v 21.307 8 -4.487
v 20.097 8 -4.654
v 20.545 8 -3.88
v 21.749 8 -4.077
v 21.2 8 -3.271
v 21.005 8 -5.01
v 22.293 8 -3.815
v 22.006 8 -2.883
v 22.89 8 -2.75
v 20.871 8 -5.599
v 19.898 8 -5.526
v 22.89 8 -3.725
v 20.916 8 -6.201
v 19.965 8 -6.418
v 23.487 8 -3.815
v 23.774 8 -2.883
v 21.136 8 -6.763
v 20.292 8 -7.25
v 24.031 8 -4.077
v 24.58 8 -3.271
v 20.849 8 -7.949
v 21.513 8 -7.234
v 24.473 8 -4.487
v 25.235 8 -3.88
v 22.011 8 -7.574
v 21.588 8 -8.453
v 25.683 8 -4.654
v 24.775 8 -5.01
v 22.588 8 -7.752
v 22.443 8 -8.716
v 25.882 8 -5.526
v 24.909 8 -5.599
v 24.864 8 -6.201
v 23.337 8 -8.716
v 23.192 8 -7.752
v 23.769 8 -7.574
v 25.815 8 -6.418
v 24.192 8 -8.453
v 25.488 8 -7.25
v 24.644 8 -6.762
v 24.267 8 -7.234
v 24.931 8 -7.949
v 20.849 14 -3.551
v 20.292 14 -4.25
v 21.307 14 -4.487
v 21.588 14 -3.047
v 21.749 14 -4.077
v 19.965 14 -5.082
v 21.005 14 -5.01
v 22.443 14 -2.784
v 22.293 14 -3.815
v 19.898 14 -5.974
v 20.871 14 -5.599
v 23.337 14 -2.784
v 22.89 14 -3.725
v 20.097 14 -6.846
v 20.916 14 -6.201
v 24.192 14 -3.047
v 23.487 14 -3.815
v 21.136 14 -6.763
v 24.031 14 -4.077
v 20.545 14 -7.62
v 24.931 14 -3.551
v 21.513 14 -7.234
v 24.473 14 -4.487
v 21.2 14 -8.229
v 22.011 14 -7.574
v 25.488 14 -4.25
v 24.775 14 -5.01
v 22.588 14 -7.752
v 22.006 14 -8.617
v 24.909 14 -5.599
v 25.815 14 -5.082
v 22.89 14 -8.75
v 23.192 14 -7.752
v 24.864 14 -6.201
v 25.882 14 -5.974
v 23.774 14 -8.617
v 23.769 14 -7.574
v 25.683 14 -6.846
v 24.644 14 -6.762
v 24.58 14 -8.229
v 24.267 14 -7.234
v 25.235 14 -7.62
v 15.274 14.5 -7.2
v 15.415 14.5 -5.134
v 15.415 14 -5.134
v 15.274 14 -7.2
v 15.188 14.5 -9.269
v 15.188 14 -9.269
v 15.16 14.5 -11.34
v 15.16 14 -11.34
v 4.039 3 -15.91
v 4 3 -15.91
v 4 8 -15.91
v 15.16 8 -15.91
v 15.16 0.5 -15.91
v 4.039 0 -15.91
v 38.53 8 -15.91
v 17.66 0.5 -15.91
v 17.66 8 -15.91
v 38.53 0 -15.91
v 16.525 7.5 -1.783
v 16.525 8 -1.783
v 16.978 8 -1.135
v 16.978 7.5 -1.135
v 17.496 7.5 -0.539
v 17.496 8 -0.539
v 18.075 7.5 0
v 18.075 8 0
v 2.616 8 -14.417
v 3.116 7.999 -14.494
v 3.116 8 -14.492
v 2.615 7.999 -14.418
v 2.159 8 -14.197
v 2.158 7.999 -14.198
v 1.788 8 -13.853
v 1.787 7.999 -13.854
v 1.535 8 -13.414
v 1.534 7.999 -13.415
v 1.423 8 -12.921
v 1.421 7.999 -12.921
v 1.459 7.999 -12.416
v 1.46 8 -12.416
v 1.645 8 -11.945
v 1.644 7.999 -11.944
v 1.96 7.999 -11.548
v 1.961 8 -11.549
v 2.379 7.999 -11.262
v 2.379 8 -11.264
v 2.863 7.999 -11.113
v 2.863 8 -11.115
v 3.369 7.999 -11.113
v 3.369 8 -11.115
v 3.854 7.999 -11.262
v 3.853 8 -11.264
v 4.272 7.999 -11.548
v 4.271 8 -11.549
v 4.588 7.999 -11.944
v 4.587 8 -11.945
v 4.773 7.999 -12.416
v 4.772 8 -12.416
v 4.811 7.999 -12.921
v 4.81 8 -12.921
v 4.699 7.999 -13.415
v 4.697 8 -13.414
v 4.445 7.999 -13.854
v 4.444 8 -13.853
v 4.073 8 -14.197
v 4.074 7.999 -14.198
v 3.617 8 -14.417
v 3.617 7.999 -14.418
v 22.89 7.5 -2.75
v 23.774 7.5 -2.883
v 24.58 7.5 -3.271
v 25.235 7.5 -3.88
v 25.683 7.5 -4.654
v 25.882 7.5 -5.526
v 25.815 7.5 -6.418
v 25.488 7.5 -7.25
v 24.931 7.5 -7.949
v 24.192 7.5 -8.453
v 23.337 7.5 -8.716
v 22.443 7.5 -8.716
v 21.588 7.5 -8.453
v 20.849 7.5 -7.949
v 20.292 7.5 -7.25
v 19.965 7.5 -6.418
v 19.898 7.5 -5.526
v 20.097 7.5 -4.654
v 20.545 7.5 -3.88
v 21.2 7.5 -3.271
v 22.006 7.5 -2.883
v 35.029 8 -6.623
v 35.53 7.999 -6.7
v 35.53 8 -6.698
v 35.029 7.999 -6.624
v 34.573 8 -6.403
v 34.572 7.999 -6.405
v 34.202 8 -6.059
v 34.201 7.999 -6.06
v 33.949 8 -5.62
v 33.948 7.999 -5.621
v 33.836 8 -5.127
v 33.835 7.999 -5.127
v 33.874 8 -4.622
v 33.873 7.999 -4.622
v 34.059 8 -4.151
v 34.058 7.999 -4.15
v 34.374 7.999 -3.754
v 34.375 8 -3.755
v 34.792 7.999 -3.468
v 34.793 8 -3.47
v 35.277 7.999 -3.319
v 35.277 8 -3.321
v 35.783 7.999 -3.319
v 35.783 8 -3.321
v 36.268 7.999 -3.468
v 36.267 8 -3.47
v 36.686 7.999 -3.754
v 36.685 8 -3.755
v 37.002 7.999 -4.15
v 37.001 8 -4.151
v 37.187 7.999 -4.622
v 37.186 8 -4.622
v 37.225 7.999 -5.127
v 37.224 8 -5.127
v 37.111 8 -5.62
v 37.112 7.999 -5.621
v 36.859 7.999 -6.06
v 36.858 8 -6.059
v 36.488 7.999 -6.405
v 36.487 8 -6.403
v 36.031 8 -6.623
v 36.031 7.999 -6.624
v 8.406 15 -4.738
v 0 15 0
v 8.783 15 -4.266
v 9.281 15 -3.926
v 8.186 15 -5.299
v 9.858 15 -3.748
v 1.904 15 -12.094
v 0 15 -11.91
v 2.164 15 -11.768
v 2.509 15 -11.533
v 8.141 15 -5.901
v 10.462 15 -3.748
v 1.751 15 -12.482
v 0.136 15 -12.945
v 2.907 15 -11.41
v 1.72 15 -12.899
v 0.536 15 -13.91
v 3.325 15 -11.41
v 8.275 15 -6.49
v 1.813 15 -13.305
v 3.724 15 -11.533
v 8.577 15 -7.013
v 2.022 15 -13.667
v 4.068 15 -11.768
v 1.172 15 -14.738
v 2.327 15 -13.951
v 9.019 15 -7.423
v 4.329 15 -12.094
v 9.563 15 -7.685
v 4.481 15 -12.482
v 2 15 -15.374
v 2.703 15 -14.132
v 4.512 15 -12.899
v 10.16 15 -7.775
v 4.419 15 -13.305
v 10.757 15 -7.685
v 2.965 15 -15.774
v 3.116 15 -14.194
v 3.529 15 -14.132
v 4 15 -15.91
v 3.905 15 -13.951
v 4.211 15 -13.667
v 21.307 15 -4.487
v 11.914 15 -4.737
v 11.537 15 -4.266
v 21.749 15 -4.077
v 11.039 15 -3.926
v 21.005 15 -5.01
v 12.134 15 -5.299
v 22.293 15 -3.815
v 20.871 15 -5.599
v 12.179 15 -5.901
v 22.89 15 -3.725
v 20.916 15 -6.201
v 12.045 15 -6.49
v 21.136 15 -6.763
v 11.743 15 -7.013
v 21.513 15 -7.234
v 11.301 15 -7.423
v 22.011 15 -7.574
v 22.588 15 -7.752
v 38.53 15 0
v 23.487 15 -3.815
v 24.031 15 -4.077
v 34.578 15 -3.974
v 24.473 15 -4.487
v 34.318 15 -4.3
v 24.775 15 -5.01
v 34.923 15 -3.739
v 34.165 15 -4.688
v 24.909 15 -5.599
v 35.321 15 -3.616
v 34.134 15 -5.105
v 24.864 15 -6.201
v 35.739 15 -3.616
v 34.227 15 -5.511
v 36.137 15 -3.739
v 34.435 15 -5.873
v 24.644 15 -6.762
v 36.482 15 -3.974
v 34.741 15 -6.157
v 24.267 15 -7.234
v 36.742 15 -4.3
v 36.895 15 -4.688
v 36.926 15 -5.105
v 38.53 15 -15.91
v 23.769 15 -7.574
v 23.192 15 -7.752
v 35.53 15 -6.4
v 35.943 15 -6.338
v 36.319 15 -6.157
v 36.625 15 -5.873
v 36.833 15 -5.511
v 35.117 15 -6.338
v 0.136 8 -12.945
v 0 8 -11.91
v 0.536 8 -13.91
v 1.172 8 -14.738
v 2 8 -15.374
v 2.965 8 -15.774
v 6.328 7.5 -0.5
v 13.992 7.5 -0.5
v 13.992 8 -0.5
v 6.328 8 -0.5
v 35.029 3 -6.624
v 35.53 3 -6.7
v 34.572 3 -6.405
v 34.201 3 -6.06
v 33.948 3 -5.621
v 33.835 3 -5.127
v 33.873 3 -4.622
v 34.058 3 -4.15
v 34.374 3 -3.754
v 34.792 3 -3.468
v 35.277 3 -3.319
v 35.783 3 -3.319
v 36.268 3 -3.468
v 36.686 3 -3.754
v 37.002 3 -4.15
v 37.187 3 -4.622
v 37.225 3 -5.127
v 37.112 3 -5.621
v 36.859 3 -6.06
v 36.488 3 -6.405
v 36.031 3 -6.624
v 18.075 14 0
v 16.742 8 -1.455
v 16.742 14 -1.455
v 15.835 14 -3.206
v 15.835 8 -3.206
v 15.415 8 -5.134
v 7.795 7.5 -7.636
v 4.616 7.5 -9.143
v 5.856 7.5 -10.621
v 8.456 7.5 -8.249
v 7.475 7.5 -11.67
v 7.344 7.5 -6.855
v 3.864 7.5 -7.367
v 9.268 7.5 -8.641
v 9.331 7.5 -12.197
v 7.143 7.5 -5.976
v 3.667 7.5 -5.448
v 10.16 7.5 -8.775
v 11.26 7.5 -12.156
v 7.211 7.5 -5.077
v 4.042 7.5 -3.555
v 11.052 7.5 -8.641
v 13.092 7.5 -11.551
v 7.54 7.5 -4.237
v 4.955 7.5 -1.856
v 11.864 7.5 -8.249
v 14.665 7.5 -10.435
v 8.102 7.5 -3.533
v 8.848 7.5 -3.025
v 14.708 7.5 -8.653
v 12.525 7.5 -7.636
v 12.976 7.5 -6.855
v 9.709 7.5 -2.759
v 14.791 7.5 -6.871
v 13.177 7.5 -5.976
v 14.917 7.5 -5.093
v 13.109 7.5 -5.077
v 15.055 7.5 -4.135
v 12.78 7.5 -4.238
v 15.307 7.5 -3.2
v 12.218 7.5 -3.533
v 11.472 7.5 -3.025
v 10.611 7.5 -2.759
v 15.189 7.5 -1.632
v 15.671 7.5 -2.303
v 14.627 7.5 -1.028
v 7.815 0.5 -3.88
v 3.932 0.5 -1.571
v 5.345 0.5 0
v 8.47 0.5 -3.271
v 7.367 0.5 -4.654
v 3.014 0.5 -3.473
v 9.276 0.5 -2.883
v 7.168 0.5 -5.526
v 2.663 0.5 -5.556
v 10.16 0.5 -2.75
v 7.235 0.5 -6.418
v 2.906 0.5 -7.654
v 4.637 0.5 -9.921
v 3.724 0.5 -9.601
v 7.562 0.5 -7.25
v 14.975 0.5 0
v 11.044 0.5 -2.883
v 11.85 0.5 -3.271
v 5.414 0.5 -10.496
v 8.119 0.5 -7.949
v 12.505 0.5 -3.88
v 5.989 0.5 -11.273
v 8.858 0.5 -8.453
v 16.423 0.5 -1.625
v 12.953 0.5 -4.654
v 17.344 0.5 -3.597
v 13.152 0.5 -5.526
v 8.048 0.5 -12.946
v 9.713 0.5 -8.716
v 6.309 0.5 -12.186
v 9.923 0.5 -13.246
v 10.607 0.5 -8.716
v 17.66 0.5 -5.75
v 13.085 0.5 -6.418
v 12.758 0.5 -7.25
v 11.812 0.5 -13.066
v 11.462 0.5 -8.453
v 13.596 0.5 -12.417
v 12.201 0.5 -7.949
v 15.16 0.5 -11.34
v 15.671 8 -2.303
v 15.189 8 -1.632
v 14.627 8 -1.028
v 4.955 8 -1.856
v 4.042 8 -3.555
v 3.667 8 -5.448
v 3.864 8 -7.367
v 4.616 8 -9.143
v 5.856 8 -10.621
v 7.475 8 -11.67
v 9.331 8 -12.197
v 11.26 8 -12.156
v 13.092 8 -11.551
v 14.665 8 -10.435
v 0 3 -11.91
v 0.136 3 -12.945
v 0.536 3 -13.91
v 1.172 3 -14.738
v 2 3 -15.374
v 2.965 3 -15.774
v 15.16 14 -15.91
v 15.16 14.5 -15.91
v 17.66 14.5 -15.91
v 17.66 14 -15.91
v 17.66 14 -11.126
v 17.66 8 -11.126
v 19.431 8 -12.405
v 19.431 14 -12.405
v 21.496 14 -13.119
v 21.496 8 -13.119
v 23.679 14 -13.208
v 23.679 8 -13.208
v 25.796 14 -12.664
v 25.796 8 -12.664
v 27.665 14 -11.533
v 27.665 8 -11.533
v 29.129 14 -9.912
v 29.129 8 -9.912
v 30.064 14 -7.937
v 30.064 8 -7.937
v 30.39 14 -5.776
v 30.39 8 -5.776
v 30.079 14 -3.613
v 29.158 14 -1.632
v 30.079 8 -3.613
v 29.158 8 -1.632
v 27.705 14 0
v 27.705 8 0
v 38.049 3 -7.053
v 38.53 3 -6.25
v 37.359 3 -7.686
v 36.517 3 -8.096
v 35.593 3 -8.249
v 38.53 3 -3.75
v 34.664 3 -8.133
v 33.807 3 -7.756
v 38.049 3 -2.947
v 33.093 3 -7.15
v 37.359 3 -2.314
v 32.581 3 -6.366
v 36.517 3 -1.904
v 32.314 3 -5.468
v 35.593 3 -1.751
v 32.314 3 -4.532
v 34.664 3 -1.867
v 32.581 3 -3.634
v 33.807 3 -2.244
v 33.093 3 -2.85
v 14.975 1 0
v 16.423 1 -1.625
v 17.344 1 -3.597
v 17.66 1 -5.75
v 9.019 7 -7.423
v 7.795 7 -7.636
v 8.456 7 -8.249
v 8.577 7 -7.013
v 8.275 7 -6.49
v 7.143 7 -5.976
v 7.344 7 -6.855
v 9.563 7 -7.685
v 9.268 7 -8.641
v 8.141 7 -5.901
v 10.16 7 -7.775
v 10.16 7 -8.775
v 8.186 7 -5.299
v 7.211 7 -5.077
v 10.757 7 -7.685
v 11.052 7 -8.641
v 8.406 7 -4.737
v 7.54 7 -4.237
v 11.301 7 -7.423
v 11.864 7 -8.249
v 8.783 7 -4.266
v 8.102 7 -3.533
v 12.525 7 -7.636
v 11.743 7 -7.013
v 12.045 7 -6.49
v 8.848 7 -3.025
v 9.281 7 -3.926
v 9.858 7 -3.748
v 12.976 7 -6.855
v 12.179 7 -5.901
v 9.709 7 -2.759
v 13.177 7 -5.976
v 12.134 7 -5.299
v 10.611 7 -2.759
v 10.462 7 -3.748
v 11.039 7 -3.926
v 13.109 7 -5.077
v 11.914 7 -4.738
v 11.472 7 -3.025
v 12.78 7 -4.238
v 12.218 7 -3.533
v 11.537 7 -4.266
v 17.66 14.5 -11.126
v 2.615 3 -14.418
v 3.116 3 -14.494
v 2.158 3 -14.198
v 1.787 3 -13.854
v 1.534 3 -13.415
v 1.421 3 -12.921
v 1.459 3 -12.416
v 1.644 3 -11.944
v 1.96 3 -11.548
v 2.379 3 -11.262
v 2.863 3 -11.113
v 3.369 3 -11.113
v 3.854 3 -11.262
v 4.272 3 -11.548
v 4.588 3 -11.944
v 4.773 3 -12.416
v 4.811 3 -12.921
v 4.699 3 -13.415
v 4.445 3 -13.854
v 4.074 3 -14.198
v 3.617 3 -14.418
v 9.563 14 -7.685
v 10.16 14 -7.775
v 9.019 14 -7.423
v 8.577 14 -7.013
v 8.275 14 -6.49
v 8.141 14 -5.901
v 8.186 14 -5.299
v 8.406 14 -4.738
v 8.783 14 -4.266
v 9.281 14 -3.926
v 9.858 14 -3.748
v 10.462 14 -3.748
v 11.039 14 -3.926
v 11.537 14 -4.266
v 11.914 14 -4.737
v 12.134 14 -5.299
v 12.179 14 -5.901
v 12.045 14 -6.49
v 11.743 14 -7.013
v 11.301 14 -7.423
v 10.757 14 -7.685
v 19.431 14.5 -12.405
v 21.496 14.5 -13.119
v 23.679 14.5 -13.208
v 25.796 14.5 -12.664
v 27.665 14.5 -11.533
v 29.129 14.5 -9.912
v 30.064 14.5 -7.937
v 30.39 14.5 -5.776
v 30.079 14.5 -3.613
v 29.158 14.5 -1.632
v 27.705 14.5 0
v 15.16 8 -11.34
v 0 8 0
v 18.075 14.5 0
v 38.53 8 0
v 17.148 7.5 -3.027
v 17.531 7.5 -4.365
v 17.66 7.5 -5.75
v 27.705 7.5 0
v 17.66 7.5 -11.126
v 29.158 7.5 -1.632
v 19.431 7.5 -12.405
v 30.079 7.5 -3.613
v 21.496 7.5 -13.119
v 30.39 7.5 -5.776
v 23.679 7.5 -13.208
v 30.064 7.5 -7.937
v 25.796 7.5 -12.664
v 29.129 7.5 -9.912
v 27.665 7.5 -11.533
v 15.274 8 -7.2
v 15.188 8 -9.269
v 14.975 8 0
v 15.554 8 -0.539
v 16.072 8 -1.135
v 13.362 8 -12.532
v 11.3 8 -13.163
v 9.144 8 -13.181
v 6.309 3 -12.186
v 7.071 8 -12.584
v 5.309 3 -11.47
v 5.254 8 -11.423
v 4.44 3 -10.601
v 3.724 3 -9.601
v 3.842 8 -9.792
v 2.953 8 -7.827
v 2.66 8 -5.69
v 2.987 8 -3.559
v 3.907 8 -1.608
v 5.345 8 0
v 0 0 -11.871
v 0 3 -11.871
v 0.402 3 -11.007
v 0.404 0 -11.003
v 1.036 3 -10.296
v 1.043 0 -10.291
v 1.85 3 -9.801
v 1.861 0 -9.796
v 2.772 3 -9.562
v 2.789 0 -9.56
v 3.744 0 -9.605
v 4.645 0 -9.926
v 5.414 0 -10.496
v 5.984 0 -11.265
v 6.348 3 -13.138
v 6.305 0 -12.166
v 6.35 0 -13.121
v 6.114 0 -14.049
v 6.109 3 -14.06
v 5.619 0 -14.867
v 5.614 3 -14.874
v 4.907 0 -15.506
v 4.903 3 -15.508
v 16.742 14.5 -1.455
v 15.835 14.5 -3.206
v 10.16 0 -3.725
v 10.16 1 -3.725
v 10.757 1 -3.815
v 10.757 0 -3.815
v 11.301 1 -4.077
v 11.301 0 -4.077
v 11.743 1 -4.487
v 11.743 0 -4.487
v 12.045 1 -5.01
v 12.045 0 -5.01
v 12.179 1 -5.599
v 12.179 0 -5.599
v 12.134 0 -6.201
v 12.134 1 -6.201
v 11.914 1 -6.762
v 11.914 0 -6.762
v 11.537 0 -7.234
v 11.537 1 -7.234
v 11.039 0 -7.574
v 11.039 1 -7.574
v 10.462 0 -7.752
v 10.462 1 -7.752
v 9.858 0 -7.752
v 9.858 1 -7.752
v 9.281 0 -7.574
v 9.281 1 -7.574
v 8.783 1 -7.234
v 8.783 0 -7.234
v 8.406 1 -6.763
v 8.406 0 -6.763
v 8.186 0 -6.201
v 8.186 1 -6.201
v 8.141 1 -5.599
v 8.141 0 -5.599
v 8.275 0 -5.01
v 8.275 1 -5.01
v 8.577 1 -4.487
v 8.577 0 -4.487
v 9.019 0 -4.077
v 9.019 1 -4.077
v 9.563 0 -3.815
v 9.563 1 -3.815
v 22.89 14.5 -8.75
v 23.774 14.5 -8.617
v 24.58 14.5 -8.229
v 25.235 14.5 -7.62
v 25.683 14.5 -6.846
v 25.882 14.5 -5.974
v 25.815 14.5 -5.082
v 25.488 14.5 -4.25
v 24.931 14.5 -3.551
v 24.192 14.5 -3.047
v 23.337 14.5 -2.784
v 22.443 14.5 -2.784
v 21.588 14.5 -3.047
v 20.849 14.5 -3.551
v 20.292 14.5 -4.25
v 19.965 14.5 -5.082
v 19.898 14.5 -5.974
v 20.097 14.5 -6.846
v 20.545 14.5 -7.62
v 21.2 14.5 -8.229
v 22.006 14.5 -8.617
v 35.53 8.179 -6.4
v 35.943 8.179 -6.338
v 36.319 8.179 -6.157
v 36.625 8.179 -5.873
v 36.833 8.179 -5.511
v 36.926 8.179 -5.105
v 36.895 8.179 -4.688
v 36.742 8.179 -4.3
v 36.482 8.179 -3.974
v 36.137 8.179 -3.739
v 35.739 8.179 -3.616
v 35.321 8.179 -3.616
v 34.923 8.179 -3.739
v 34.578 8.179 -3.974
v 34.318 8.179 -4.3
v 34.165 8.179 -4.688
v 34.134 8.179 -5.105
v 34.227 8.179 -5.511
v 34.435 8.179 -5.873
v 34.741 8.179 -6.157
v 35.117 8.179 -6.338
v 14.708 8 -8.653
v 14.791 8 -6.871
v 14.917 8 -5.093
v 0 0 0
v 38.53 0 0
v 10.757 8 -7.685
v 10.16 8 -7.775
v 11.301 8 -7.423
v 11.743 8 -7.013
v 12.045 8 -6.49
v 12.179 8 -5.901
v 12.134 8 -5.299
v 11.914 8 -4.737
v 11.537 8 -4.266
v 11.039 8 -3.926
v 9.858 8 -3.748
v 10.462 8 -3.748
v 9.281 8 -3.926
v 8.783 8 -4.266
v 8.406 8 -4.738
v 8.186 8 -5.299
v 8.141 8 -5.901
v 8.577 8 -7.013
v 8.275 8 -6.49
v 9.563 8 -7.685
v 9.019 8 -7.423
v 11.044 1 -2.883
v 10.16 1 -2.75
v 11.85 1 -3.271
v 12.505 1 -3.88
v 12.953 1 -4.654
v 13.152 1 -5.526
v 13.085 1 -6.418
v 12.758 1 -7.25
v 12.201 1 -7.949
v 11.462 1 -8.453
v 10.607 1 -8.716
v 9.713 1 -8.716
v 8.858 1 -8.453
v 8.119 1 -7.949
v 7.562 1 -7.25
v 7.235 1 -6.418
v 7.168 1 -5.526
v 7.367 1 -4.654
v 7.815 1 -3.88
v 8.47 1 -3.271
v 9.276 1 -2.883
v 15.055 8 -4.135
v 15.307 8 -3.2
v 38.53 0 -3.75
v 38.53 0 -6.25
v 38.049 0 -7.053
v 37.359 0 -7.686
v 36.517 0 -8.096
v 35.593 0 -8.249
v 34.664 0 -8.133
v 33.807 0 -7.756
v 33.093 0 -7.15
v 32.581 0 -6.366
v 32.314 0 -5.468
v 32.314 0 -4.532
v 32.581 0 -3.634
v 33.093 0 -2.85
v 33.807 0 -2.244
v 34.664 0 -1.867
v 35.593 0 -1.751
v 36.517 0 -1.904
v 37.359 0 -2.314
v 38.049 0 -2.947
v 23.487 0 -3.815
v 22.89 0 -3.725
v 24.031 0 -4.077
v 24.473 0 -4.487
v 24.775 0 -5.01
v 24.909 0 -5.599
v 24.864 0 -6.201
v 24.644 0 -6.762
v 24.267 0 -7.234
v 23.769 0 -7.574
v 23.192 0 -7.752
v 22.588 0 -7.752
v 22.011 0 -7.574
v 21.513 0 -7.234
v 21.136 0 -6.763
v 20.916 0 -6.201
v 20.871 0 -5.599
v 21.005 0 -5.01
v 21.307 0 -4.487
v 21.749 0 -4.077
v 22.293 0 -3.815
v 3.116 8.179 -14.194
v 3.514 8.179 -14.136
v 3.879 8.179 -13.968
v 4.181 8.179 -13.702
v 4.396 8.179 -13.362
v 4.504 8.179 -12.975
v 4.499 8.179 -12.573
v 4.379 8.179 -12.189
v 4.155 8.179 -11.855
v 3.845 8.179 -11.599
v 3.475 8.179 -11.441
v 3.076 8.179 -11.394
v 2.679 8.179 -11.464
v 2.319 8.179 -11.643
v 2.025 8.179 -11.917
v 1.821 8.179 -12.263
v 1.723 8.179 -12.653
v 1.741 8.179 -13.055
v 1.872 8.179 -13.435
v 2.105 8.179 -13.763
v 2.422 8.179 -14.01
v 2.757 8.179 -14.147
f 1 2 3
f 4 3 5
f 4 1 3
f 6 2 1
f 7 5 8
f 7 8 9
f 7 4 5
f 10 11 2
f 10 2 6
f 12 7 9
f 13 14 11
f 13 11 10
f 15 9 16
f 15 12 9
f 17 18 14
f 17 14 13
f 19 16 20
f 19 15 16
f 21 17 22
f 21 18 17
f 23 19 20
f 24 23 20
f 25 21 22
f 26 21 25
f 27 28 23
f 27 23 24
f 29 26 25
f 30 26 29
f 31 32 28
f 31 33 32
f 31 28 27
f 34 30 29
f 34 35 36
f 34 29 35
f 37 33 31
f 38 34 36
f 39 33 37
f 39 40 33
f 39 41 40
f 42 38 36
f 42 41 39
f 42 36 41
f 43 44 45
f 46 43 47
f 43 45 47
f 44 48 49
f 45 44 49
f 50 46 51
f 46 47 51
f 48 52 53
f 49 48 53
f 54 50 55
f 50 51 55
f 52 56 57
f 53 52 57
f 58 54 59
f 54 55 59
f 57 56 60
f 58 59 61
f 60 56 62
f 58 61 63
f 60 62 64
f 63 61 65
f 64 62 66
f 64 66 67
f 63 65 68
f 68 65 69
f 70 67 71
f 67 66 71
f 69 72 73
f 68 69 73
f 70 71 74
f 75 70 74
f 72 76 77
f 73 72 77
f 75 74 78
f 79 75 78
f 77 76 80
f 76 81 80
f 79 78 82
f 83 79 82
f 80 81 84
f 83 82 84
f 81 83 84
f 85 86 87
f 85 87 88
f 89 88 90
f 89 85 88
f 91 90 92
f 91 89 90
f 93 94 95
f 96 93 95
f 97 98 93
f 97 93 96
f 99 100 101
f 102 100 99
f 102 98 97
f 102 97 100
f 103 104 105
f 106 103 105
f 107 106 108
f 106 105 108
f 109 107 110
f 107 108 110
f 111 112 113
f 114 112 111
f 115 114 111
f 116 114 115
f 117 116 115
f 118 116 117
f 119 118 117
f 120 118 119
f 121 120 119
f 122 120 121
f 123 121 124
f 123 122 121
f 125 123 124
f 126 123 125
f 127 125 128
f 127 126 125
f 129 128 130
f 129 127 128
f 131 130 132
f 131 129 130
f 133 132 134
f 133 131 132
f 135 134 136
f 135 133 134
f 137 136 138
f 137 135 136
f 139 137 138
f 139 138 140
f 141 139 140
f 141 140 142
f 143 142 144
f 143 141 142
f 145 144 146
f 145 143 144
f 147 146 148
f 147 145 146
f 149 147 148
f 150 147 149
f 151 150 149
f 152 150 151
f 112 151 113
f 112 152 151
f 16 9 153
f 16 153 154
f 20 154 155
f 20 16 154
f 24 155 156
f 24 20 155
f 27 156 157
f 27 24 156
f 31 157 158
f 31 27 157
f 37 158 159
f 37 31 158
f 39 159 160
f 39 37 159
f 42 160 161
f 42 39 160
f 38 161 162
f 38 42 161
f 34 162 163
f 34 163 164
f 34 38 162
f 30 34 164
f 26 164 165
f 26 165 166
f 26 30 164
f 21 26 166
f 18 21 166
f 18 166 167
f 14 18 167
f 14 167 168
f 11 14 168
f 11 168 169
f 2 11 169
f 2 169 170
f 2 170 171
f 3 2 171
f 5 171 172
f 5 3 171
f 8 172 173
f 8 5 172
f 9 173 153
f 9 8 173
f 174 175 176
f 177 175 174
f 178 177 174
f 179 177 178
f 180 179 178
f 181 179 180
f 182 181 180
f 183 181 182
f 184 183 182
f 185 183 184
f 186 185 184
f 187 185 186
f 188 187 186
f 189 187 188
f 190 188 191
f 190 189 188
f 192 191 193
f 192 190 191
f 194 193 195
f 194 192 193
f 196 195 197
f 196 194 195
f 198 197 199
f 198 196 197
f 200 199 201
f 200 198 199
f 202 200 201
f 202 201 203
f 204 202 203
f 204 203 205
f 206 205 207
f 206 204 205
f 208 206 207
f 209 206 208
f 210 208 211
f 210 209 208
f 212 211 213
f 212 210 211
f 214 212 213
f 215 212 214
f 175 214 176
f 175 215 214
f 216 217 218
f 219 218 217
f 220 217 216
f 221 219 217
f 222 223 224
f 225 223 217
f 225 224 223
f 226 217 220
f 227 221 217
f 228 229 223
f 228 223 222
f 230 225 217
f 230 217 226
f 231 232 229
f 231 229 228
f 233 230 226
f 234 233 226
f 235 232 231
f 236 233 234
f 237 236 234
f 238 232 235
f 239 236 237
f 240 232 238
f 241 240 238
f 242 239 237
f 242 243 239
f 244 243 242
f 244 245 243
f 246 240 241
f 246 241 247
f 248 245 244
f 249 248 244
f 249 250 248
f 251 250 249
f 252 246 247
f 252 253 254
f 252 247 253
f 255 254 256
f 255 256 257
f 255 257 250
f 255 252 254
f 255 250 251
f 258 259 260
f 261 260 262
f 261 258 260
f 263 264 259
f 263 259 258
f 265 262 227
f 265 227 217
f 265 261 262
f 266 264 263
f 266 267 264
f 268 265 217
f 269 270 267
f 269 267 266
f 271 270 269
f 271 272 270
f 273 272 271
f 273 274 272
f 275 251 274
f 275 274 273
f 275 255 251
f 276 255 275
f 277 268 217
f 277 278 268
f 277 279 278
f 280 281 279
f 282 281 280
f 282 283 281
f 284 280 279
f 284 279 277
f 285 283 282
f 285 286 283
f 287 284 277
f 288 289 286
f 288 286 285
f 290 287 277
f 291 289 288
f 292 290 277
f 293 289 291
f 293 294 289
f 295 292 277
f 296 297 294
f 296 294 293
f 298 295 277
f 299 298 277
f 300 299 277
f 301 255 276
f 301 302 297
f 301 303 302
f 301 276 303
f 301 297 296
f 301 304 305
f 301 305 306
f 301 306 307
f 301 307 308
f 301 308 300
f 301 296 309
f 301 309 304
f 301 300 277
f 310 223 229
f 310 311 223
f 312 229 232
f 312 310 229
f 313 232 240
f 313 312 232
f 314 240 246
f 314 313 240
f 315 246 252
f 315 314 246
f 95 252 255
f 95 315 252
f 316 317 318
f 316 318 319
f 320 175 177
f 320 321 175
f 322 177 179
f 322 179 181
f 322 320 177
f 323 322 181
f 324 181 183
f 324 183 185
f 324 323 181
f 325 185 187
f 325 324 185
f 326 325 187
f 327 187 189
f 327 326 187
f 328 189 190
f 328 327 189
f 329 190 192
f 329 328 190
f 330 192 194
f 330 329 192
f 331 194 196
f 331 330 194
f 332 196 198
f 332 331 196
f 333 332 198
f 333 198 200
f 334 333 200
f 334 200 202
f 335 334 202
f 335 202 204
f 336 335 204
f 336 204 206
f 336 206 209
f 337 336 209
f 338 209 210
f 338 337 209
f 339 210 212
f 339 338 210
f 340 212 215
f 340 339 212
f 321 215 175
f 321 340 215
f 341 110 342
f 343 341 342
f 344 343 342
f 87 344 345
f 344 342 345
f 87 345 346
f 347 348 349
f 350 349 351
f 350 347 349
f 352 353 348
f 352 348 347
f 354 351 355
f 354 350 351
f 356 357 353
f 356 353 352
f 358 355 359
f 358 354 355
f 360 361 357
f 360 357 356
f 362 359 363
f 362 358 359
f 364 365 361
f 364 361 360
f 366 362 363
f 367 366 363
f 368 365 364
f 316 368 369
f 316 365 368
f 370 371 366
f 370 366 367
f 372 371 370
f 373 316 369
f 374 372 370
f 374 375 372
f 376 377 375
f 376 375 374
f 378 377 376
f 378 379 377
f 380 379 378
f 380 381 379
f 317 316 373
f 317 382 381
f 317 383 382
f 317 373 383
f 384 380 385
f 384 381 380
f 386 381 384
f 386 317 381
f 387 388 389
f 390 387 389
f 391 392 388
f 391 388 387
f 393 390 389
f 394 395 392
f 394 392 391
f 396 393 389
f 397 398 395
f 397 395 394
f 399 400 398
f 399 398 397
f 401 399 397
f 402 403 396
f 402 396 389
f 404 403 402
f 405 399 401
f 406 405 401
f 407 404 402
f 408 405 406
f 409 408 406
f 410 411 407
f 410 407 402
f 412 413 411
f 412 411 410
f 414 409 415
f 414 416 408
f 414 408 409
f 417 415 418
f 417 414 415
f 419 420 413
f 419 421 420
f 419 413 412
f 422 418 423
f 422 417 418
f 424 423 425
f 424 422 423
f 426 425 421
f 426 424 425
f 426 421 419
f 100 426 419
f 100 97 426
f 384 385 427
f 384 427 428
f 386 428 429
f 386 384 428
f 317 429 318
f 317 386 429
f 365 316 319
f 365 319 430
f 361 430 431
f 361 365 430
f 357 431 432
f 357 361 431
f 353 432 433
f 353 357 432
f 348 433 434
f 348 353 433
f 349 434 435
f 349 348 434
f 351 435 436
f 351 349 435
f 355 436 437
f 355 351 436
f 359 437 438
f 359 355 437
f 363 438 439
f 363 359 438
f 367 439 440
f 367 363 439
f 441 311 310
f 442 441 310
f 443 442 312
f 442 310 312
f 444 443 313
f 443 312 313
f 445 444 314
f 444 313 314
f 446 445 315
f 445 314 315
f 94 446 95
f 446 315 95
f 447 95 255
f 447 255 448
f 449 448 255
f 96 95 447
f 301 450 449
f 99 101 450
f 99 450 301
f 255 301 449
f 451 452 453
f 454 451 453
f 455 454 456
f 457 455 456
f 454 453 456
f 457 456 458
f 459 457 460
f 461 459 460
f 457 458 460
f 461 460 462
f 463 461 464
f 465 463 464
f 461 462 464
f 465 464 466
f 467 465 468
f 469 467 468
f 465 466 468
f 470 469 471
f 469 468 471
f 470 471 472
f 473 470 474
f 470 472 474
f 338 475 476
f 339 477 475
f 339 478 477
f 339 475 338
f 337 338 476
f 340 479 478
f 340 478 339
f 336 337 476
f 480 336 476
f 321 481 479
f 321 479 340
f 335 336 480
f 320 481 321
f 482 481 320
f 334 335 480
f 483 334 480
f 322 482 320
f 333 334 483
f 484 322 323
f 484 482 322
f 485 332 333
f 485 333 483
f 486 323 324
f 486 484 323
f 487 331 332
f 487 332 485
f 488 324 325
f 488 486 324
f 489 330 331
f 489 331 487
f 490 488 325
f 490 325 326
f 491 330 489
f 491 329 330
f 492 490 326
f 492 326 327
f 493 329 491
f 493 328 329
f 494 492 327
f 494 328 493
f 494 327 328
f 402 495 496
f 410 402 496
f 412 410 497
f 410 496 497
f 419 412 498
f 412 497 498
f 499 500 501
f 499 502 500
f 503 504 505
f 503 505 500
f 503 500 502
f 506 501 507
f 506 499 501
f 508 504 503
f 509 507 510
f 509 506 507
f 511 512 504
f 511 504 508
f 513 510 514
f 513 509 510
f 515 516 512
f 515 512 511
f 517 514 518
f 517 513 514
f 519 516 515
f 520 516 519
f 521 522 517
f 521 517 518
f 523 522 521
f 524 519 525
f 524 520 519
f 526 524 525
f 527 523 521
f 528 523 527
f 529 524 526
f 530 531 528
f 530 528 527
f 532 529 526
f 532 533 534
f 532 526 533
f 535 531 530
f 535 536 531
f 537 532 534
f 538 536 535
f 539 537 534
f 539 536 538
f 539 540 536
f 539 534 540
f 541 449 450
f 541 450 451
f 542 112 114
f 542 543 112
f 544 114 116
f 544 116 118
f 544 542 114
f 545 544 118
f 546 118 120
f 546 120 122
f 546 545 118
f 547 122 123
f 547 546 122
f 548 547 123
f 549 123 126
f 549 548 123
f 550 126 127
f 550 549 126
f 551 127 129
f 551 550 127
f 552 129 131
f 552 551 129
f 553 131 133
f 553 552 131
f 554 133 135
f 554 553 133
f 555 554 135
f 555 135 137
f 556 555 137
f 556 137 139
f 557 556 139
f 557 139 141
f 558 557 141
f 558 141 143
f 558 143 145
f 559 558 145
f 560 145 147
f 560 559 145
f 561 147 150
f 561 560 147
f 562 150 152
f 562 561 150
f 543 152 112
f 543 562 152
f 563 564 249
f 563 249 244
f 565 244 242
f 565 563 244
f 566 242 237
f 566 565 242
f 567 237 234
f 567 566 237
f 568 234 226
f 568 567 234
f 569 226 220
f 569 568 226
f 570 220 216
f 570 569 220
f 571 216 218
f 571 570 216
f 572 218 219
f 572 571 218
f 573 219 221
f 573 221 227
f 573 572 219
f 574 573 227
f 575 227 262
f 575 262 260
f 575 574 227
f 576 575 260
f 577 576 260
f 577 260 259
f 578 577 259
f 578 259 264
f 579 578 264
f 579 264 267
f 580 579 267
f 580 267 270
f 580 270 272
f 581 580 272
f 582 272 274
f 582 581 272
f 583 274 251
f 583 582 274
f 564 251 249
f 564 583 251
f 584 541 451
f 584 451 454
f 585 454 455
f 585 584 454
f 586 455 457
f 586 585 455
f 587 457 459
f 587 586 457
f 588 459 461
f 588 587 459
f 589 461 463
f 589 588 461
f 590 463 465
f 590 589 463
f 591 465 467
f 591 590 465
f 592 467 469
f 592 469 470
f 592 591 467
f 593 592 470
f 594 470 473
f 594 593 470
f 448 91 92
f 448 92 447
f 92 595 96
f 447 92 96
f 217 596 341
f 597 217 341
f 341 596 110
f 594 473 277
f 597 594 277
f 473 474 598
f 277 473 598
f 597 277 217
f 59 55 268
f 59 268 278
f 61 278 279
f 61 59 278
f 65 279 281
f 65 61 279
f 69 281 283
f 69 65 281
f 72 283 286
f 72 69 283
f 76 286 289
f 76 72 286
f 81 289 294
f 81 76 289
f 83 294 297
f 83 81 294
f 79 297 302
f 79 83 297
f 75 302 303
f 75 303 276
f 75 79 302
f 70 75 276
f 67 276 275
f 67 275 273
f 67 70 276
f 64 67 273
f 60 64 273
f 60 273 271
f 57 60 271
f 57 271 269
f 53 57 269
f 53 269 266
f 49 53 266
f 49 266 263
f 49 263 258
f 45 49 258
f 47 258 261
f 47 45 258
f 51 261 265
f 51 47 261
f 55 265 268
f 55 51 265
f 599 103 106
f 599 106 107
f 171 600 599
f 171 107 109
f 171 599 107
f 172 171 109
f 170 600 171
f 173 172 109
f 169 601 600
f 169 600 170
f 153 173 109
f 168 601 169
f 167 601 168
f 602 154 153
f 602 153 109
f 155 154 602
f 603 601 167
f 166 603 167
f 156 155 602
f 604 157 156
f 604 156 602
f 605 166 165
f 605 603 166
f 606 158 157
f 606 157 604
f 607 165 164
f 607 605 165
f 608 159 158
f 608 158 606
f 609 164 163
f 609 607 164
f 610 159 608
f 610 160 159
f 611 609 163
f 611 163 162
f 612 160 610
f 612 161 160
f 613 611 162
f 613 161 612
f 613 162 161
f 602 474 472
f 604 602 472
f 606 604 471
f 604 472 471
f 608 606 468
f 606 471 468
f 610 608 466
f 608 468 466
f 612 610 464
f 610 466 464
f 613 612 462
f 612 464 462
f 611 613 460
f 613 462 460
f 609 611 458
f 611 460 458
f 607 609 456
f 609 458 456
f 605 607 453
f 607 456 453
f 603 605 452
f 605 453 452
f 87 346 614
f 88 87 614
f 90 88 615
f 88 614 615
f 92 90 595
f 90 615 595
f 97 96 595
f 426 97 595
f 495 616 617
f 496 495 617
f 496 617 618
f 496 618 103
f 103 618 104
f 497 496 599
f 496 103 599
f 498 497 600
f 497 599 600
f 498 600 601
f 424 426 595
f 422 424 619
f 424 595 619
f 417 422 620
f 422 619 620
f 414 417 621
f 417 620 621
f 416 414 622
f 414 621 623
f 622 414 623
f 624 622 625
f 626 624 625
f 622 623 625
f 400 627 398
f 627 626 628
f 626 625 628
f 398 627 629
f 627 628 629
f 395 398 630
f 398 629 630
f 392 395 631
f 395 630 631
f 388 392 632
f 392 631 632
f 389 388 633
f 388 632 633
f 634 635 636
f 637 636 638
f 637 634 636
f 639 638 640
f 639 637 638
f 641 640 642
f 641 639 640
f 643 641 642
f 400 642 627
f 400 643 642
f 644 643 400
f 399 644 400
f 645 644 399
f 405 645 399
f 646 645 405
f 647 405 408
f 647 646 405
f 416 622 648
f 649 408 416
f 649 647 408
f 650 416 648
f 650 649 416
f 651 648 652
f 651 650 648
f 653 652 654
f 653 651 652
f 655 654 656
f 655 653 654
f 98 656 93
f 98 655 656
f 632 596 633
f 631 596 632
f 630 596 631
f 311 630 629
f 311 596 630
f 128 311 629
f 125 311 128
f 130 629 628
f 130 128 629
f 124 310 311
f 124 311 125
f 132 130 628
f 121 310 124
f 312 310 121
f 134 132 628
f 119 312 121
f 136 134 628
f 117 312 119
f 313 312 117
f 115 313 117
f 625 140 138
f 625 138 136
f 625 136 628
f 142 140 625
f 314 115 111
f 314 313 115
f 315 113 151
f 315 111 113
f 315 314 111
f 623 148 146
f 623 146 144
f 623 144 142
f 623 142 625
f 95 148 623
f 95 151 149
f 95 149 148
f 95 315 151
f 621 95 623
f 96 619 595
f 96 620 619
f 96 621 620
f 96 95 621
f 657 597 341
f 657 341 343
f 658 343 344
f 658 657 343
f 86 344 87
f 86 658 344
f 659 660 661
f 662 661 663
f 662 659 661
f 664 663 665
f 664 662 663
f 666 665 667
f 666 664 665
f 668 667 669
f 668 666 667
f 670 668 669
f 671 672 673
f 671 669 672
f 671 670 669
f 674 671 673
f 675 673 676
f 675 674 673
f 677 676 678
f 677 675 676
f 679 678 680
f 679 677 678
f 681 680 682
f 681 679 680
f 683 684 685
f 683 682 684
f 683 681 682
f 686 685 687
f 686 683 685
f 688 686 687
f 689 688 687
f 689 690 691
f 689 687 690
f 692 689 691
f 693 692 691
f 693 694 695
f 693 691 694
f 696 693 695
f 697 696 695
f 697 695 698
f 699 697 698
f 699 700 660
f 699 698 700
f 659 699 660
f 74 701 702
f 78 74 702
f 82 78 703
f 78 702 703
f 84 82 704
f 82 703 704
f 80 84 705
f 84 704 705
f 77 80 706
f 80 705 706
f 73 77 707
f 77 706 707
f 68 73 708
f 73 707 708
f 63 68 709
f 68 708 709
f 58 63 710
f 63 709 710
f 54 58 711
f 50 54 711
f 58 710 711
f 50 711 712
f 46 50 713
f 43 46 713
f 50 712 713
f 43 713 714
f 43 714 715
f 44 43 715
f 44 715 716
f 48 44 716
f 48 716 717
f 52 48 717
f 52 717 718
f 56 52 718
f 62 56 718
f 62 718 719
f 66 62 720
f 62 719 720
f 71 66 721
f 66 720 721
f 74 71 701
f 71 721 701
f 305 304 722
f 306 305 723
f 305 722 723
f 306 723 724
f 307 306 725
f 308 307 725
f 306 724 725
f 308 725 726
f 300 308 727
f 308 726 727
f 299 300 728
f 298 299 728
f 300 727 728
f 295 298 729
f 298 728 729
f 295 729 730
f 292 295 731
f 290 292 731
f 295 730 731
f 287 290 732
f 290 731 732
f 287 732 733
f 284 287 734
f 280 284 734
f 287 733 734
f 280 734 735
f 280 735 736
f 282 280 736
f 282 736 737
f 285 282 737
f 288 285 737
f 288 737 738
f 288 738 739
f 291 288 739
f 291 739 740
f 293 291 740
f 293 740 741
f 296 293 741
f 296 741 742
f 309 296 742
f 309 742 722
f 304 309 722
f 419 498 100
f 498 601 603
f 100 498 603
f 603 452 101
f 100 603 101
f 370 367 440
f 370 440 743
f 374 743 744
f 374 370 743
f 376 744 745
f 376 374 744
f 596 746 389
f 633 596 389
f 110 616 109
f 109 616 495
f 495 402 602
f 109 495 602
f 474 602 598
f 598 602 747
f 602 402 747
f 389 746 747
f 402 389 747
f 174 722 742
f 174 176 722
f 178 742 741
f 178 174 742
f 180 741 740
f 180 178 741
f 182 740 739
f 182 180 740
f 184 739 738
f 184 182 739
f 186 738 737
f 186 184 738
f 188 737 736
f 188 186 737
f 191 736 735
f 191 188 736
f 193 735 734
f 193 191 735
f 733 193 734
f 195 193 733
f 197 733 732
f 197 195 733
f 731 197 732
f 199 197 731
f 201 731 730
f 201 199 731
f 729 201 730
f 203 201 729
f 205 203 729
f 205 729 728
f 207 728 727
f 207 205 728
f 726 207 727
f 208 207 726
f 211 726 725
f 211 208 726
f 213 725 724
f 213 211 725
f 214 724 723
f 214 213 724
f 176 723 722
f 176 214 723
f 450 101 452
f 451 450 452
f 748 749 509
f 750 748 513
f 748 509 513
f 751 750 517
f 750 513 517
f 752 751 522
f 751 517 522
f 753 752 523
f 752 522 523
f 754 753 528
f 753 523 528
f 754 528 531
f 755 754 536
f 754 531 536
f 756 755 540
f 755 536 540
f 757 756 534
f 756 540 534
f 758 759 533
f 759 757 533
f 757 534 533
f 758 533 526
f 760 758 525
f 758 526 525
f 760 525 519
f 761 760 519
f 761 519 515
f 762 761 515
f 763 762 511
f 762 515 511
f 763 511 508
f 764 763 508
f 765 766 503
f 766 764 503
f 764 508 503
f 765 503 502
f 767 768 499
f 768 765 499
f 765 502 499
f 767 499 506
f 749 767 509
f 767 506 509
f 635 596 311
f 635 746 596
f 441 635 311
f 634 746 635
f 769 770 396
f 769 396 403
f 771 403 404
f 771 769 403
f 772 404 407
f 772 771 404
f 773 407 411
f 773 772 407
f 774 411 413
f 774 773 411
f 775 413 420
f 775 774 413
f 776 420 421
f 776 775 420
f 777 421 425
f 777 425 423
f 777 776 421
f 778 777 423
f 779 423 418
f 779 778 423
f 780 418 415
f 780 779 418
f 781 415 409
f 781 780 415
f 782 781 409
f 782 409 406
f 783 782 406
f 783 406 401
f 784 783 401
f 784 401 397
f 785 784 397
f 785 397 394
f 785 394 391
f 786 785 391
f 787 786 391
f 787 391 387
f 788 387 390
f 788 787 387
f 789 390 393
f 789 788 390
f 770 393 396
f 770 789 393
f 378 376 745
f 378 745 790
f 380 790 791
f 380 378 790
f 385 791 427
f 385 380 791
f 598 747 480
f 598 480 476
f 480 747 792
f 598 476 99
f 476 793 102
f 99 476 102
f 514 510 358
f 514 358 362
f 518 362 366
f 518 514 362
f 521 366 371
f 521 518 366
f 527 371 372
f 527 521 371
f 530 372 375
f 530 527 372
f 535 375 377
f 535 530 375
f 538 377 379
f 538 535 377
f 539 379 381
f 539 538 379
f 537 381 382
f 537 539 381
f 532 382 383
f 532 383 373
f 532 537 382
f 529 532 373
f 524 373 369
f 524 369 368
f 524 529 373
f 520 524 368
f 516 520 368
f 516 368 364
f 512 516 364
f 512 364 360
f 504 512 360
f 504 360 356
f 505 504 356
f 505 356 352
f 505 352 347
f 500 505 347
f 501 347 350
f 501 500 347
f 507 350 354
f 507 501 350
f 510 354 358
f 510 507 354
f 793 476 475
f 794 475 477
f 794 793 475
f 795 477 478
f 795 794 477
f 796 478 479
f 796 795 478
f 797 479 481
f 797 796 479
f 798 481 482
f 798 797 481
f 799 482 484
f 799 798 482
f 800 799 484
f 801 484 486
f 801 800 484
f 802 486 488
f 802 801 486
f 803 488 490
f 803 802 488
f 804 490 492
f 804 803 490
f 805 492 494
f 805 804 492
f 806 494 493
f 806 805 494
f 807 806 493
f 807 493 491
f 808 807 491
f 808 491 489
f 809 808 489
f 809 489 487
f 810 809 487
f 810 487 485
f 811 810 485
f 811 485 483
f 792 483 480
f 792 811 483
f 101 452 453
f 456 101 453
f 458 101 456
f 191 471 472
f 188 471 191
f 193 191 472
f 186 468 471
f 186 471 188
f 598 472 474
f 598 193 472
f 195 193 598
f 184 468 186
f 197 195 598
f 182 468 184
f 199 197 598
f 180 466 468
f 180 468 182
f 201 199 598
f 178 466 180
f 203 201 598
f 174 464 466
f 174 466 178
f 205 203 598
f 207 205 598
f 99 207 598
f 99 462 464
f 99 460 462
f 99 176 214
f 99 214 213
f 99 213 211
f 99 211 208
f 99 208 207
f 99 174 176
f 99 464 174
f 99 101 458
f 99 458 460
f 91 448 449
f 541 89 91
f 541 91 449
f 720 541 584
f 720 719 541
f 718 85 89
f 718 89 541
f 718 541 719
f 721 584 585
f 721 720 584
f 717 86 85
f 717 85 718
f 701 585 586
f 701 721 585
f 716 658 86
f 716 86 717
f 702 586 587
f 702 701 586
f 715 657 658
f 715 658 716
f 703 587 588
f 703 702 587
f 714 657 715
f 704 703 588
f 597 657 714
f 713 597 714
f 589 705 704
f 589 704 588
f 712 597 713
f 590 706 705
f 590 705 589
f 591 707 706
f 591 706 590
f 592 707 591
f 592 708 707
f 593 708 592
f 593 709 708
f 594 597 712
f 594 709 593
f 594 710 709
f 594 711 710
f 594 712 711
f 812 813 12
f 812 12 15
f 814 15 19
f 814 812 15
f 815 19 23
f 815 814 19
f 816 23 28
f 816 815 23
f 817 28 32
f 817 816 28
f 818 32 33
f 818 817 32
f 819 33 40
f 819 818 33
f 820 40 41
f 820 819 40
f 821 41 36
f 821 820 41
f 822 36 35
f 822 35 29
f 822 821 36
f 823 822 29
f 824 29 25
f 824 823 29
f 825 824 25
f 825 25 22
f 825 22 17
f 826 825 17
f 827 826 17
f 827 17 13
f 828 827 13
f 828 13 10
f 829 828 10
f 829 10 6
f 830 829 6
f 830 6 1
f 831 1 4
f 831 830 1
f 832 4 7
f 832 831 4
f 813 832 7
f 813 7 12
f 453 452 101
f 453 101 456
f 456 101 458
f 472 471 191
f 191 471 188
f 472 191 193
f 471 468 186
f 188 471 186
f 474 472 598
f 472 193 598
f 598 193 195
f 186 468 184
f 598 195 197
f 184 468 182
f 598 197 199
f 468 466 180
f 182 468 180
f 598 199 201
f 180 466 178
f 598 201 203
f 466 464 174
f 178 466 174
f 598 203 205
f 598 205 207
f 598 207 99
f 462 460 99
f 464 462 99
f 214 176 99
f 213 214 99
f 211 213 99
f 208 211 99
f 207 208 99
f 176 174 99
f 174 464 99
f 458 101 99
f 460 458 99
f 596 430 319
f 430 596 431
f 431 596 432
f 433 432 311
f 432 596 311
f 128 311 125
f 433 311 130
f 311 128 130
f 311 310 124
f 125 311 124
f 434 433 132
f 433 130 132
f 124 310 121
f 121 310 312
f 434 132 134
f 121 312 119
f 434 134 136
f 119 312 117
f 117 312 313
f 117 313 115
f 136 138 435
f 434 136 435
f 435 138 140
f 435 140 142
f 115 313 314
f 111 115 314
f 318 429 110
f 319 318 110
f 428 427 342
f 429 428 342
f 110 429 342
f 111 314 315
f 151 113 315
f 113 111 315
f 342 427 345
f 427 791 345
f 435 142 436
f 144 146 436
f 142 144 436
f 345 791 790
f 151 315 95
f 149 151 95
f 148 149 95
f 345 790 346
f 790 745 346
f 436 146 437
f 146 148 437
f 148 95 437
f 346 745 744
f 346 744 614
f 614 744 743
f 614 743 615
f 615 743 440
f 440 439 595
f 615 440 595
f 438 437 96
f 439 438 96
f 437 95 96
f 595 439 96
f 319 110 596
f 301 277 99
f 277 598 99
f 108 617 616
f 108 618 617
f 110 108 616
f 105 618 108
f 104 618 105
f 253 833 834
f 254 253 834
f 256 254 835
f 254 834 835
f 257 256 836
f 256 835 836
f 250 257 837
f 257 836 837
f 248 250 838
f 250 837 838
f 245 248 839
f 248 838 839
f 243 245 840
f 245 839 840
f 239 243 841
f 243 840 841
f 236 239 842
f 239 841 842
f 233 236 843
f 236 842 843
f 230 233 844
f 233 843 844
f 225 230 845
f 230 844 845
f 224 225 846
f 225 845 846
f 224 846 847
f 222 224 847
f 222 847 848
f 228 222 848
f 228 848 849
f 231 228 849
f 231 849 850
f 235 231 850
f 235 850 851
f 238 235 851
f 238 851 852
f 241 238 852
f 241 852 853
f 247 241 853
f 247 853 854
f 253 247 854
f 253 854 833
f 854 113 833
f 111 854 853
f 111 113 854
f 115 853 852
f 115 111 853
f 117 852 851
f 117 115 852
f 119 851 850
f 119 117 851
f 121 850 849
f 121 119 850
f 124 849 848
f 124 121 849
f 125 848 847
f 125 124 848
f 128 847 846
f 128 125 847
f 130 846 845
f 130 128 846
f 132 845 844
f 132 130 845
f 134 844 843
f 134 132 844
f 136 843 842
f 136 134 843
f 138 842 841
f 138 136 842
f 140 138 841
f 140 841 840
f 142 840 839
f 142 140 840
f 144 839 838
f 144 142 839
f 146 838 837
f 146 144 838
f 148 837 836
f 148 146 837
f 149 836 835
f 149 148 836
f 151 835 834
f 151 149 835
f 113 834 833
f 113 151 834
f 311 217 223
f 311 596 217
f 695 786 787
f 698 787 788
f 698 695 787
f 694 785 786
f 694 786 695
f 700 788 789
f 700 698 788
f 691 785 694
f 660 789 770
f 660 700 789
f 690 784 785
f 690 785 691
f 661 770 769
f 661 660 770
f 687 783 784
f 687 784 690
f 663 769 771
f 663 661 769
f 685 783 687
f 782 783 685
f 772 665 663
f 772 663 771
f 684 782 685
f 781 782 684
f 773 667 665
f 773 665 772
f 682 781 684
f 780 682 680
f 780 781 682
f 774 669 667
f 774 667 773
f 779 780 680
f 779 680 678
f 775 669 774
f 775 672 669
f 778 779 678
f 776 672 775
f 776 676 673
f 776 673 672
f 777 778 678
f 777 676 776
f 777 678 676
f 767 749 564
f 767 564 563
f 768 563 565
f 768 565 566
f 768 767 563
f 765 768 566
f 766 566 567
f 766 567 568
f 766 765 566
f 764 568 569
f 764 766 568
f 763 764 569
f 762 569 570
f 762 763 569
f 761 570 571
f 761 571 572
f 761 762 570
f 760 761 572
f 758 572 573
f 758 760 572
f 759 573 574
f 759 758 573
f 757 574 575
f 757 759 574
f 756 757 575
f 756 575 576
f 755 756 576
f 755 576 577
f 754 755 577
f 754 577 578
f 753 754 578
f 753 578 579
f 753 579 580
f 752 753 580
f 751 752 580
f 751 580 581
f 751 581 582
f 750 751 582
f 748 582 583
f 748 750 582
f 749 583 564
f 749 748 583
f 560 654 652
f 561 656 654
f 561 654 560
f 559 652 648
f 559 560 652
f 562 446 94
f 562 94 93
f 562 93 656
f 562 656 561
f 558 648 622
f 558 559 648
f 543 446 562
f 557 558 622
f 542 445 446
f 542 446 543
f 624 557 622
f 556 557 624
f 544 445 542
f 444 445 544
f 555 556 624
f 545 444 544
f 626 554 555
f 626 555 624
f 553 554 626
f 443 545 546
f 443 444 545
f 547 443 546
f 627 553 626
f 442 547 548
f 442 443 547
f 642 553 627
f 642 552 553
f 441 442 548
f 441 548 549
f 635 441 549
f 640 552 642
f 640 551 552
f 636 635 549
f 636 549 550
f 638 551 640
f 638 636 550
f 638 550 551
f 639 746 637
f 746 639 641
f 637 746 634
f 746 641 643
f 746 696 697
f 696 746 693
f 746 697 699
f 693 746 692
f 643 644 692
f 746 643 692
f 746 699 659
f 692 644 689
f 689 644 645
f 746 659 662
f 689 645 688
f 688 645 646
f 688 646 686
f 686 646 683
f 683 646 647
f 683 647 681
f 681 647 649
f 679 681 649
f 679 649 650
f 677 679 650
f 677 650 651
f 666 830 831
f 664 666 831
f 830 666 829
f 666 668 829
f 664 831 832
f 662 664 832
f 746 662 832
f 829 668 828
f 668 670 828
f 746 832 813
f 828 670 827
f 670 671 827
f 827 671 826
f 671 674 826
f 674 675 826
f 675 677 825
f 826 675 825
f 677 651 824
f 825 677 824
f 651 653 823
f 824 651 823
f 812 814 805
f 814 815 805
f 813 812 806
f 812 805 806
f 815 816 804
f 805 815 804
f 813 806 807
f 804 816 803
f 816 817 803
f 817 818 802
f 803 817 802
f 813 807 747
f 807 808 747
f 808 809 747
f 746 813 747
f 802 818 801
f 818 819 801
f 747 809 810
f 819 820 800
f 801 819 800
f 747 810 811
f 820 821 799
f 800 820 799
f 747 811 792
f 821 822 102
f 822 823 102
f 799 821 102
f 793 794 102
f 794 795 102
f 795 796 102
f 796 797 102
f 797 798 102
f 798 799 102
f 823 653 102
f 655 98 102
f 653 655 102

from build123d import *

# Parameters (mm, degrees)
SKETCH1_W                     = 38.53
SKETCH1_H                     = 15.91
SKETCH1_R                     = 2.025
BOSS_EXTRUDE1_DEPTH           = 8
CUT_EXTRUDE1_DEPTH            = 7
SKETCH3_R                     = 3
CUT_EXTRUDE2_DEPTH            = 0.5
SKETCH5_R                     = 3
CUT_EXTRUDE4_DEPTH            = 0.5
SKETCH8_R                     = 2.025
BOSS_EXTRUDE3_DEPTH           = 6
BOSS_EXTRUDE3_2_DEPTH         = 6
BOSS_EXTRUDE5_START           = 1
SKETCH12_R                    = 2.025
BOSS_EXTRUDE5_DEPTH           = 1
SKETCH13_R                    = 3.025
CUT_EXTRUDE6_DEPTH            = 0.5
SKETCH14_W                    = 38.53
SKETCH14_H                    = 15.91
SKETCH14_R                    = 2.025
BOSS_EXTRUDE6_DEPTH           = 1
CUT_EXTRUDE7_START            = -0.5
SKETCH15_R                    = 3
CUT_EXTRUDE7_DEPTH            = 0.5
FILLET1_R                     = 4
FILLET2_R                     = 4
SKETCH23_R                    = 1.4
CUT_EXTRUDE13_DEPTH           = 43.44630726
CBORE_FOR_M3_SHCS1_AT_2_COUNT = 2
CBORE_FOR_M3_SHCS1_AT_2_PITCH = 33.337733301


with BuildPart() as part:
    # Sketch1 → Boss-Extrude1 (new body)
    with BuildSketch(Plane(origin=(0, 0, 0), x_dir=(1, 0, 0), z_dir=(0, 1, 0))):
        with Locations((19.265, 7.955)):
            Rectangle(SKETCH1_W, SKETCH1_H)
        with Locations(Location((10.16, 5.75, 0), (0, 0, 270))):
            Circle(SKETCH1_R, mode=Mode.SUBTRACT)
        with Locations(Location((22.89, 5.75, 0), (0, 0, 270))):
            Circle(SKETCH1_R, mode=Mode.SUBTRACT)
    extrude(amount=BOSS_EXTRUDE1_DEPTH)

    # Sketch2 → Cut-Extrude1 (cut)
    with BuildSketch(Plane(origin=(0, 8, 0), x_dir=(1, 0, 0), z_dir=(0, 1, 0))):
        with BuildLine():
            Line((17.66, 5.75), (17.66, 15.91))
            Line((17.66, 15.91), (15.16, 15.91))
            Line((15.16, 15.91), (15.16, 11.340169944))
            ThreePointArc((15.16, 11.340169944), (4.489163341, 10.658320649), (5.344659929, 0))
            Line((5.344659929, 0), (0, 0))
            Line((0, 0), (0, -1.75))
            Line((0, -1.75), (10.16, -1.75))
            ThreePointArc((10.16, -1.75), (15.463300859, 0.446699141), (17.66, 5.75))
        make_face()
    extrude(amount=-CUT_EXTRUDE1_DEPTH, mode=Mode.SUBTRACT)

    # Sketch3 → Cut-Extrude2 (cut)
    with BuildSketch(Plane(origin=(0, 1, 0), x_dir=(1, 0, 0), z_dir=(0, 1, 0))):
        with BuildLine():
            Line((17.66, 5.75), (17.66, 15.91))
            Line((17.66, 15.91), (15.16, 15.91))
            Line((15.16, 15.91), (15.16, 11.340169944))
            ThreePointArc((15.16, 11.340169944), (4.489163341, 10.658320649), (5.344659929, 0))
            Line((5.344659929, 0), (14.975340071, 0))
            ThreePointArc((14.975340071, 0), (16.955772603, 2.577071584), (17.66, 5.75))
        make_face()
        with Locations(Location((10.16, 5.75, 0), (0, 0, 270))):
            Circle(SKETCH3_R, mode=Mode.SUBTRACT)
    extrude(amount=-CUT_EXTRUDE2_DEPTH, mode=Mode.SUBTRACT)

    # Sketch5 → Cut-Extrude4 (cut)
    with BuildSketch(Plane(origin=(0, 8, 0), x_dir=(1, 0, 0), z_dir=(0, 1, 0))):
        with BuildLine():
            Line((17.66, 11.125602292), (17.66, 5.75))
            ThreePointArc((17.66, 5.75), (17.370669178, 3.686931896), (16.525, 1.783039577))
            ThreePointArc((16.525, 1.783039577), (30.33525861, 4.845497801), (17.66, 11.125602292))
        make_face()
        with Locations(Location((22.89, 5.75, 0), (0, 0, 270))):
            Circle(SKETCH5_R, mode=Mode.SUBTRACT)
    extrude(amount=-CUT_EXTRUDE4_DEPTH, mode=Mode.SUBTRACT)

    # Fillet2
    fillet2_edges = [part.edges().sort_by_distance(p)[0] for p in [
        (0, 4, -15.91),
    ]]
    fillet(fillet2_edges, radius=FILLET2_R)


with BuildPart() as body_2:
    # Sketch8 → Boss-Extrude3 (new body)
    with BuildSketch(Plane(origin=(0, 8, 0), x_dir=(1, 0, 0), z_dir=(0, 1, 0))):
        with BuildLine():
            Line((0, 0), (18.074659929, 0))
            ThreePointArc((18.074659929, 0), (16.230407552, 2.300387207), (15.415349089, 5.133888192))
            ThreePointArc((15.415349089, 5.133888192), (15.223864265, 8.23440368), (15.16, 11.340169944))
            Line((15.16, 11.340169944), (15.16, 15.91))
            Line((15.16, 15.91), (0, 15.91))
            Line((0, 15.91), (0, 0))
        make_face()
        with Locations(Location((10.16, 5.75, 0), (0, 0, 90))):
            Circle(SKETCH8_R, mode=Mode.SUBTRACT)
    extrude(amount=BOSS_EXTRUDE3_DEPTH)

    # Sketch12 → Boss-Extrude5 (add)
    with BuildSketch(Plane.XZ.offset(-8).offset(BOSS_EXTRUDE5_START)):
        with BuildLine():
            Line((13.992427429, -0.5), (6.327572571, -0.5))
            ThreePointArc((6.327572571, -0.5), (5.180995333, -9.928458152), (14.665384101, -10.435244295))
            ThreePointArc((14.665384101, -10.435244295), (14.744232393, -7.761816232), (14.917039028, -5.092814072))
            ThreePointArc((14.917039028, -5.092814072), (15.166862315, -3.663580986), (15.670718775, -2.302975401))
            ThreePointArc((15.670718775, -2.302975401), (14.917759485, -1.321261502), (13.992427429, -0.5))
        make_face()
        with Locations(Location((10.16, -5.75, 0), (0, 0, 270))):
            Circle(SKETCH12_R, mode=Mode.SUBTRACT)
    extrude(amount=-BOSS_EXTRUDE5_DEPTH)

    # Sketch13 → Cut-Extrude6 (cut)
    with BuildSketch(Plane.XZ.offset(-7)):
        with BuildLine():
            Line((13.992427429, -0.5), (6.327572571, -0.5))
            ThreePointArc((6.327572571, -0.5), (5.180995333, -9.928458152), (14.665384101, -10.435244295))
            ThreePointArc((14.665384101, -10.435244295), (14.744232393, -7.761816232), (14.917039028, -5.092814072))
            ThreePointArc((14.917039028, -5.092814072), (15.166862315, -3.663580986), (15.670718775, -2.302975401))
            ThreePointArc((15.670718775, -2.302975401), (14.917759485, -1.321261502), (13.992427429, -0.5))
        make_face()
        with Locations(Location((10.16, -5.75, 0), (0, 0, 270))):
            Circle(SKETCH13_R, mode=Mode.SUBTRACT)
    extrude(amount=-CUT_EXTRUDE6_DEPTH, mode=Mode.SUBTRACT)



with BuildPart() as body_3:
    # Sketch8 → Boss-Extrude3 2 (new body)
    with BuildSketch(Plane(origin=(0, 8, 0), x_dir=(1, 0, 0), z_dir=(0, 1, 0))):
        with BuildLine():
            Line((27.705340071, 0), (38.53, 0))
            Line((38.53, 0), (38.53, 15.91))
            Line((38.53, 15.91), (17.66, 15.91))
            Line((17.66, 15.91), (17.66, 11.125602292))
            ThreePointArc((17.66, 11.125602292), (28.45666348, 10.776157349), (27.705340071, 0))
        make_face()
    extrude(amount=BOSS_EXTRUDE3_2_DEPTH)


with BuildPart() as body_2_1:
    add(body_2.part)

    add(body_3.part)  # Boss-Extrude6 merges body 3
    # Sketch14 → Boss-Extrude6 (add)
    with BuildSketch(Plane(origin=(0, 14, 0), x_dir=(1, 0, 0), z_dir=(0, 1, 0))):
        with Locations((19.265, 7.955)):
            Rectangle(SKETCH14_W, SKETCH14_H)
        with Locations(Location((22.89, 5.75, 0), (0, 0, 270))):
            Circle(SKETCH14_R, mode=Mode.SUBTRACT)
        with Locations(Location((10.16, 5.75, 0), (0, 0, 90))):
            Circle(SKETCH14_R, mode=Mode.SUBTRACT)
    extrude(amount=BOSS_EXTRUDE6_DEPTH)

    # Sketch15 → Cut-Extrude7 (cut)
    with BuildSketch(Plane.XZ.offset(-14).offset(CUT_EXTRUDE7_START)):
        with BuildLine():
            Line((15.16, -11.340169944), (15.16, -15.91))
            Line((15.16, -15.91), (17.66, -15.91))
            Line((17.66, -15.91), (17.66, -11.125602292))
            ThreePointArc((17.66, -11.125602292), (28.45666348, -10.776157349), (27.705340071, 0))
            Line((27.705340071, 0), (18.074659929, 0))
            ThreePointArc((18.074659929, 0), (16.230407552, -2.300387207), (15.415349089, -5.133888192))
            ThreePointArc((15.415349089, -5.133888192), (15.223864265, -8.23440368), (15.16, -11.340169944))
        make_face()
        with Locations(Location((22.89, -5.75, 0), (0, 0, 270))):
            Circle(SKETCH15_R, mode=Mode.SUBTRACT)
    extrude(amount=CUT_EXTRUDE7_DEPTH, mode=Mode.SUBTRACT)

    # Fillet1
    fillet1_edges = [body_2_1.edges().sort_by_distance(p)[0] for p in [
        (0, 11.5, -15.91),
    ]]
    fillet(fillet1_edges, radius=FILLET1_R)

    # Sketch23 → Cut-Extrude13 (cut, through all)
    with BuildSketch(Plane.XZ.offset(-8)):
        with Locations(Location((3.116116524, -12.793883476, 0), (0, 0, 270))):
            Circle(SKETCH23_R)
        with Locations(Location((35.53, -5, 0), (0, 0, 270))):
            Circle(SKETCH23_R)
    extrude(amount=-CUT_EXTRUDE13_DEPTH, mode=Mode.SUBTRACT)


with BuildPart() as cbore_for_m3_shcs1_tool:
    # Sketch25 → CBORE for M3 SHCS1 (revolve)
    with BuildSketch(Plane(origin=(35.53, 0, -5), x_dir=(0, 0, -1), z_dir=(1, 0, 0))):
        Polygon((0, 0), (0, 9.020463052), (1.7, 7.999), (1.7, 3), (3.25, 3), (3.25, 0), align=None)
    cbore_for_m3_shcs1 = revolve(axis=Axis((35.53, -6.35, -5), (0, 1, 0)))


with BuildPart() as part_1:
    add(part.part)

    # CBORE for M3 SHCS1: cut by cbore_for_m3_shcs1_tool
    add(cbore_for_m3_shcs1_tool.part, mode=Mode.SUBTRACT)


with BuildPart() as body_2_2:
    add(body_2_1.part)

    # CBORE for M3 SHCS1: cut by cbore_for_m3_shcs1_tool
    add(cbore_for_m3_shcs1_tool.part, mode=Mode.SUBTRACT)


with BuildPart() as cbore_for_m3_shcs1_at_2_tool:
    # CBORE for M3 SHCS1 at 2: CBORE for M3 SHCS1 ×2
    with Locations(*[Vector(-0.9722881631898271, 0, -0.2337856448136884) * (i * CBORE_FOR_M3_SHCS1_AT_2_PITCH) for i in range(1, CBORE_FOR_M3_SHCS1_AT_2_COUNT)]):
        add(cbore_for_m3_shcs1)


with BuildPart() as part_2:
    add(part_1.part)

    # CBORE for M3 SHCS1 at 2: cut by cbore_for_m3_shcs1_at_2_tool
    add(cbore_for_m3_shcs1_at_2_tool.part, mode=Mode.SUBTRACT)


with BuildPart() as body_2_3:
    add(body_2_2.part)

    # CBORE for M3 SHCS1 at 2: cut by cbore_for_m3_shcs1_at_2_tool
    add(cbore_for_m3_shcs1_at_2_tool.part, mode=Mode.SUBTRACT)


solid = Compound([part_2.part, body_2_3.part])
